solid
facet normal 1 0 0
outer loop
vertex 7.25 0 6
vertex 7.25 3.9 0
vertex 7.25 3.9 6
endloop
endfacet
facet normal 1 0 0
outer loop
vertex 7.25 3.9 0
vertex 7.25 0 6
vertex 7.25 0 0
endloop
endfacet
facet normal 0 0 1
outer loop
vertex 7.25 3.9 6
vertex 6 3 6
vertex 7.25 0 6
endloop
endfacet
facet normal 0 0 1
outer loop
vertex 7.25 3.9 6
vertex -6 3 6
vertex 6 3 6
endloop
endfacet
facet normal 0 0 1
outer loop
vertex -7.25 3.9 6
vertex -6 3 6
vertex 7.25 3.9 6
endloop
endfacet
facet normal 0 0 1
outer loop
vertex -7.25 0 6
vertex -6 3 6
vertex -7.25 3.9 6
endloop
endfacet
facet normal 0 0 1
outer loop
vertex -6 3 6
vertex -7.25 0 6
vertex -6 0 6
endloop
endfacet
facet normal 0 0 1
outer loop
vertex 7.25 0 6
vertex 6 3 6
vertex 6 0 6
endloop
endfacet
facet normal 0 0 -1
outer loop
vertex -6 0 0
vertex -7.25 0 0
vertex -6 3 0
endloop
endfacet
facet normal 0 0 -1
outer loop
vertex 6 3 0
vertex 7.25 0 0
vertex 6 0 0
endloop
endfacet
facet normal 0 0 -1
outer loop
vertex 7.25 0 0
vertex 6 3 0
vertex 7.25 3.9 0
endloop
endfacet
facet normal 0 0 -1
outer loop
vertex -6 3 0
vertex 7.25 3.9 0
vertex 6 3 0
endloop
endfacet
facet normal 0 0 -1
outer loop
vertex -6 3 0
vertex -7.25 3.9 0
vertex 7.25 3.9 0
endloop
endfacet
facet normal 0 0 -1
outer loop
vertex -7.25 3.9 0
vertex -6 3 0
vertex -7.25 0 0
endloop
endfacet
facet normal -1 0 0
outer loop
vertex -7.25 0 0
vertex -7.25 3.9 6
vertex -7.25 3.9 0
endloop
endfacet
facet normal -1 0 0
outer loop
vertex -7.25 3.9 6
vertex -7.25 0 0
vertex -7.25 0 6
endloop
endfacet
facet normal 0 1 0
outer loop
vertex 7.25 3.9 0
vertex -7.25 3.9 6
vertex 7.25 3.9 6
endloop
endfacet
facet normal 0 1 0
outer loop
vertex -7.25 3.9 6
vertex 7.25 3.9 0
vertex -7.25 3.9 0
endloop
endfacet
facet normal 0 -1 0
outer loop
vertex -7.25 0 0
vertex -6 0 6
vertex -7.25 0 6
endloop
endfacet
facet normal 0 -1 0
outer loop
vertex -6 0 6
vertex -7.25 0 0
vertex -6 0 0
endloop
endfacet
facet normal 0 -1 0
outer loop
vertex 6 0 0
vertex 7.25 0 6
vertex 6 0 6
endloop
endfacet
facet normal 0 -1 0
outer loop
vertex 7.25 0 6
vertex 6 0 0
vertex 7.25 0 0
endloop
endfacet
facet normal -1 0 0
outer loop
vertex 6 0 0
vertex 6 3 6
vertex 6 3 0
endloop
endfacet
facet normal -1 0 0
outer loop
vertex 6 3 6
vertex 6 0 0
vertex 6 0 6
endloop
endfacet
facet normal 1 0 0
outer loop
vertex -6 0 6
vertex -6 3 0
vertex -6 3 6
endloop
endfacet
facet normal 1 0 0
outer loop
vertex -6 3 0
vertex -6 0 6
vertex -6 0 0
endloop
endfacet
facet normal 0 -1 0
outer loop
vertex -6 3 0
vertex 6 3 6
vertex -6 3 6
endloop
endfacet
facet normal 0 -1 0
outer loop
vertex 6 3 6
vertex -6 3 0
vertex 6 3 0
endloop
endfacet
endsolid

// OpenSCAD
// Quick fit coupon for the 3+3 individual female Dupont ends in plug v2.
// Print TWO identical halves per opening size. No electrical connection.
// The generous x opening isolates the top-to-bottom fit problem first.

inner_y = 6.0;        // test values: 6.0, 6.5, 7.0 mm
inner_x = 12.0;       // deliberately generous; v2 pocket is 10.56 mm
outer_x = 14.5;       // same total x width as the v2 driver nose
minimum_outer_y = 7.8;
minimum_y_wall = 0.8;
depth = 6.0;

outer_y = max(minimum_outer_y, inner_y + 2*minimum_y_wall);

assert(outer_x > inner_x);

// This U-shaped half can be laid against one row of 1P plastic ends while
// their wires remain attached. Rotate a second copy 180 degrees about z to
// check the opposite row. Do not force it onto an energised driver.
difference() {
    translate([-outer_x/2, 0, 0])
        cube([outer_x, outer_y/2, depth]);
    translate([-inner_x/2, -0.02, -0.02])
        cube([inner_x, inner_y/2+0.02, depth+0.04]);
}
